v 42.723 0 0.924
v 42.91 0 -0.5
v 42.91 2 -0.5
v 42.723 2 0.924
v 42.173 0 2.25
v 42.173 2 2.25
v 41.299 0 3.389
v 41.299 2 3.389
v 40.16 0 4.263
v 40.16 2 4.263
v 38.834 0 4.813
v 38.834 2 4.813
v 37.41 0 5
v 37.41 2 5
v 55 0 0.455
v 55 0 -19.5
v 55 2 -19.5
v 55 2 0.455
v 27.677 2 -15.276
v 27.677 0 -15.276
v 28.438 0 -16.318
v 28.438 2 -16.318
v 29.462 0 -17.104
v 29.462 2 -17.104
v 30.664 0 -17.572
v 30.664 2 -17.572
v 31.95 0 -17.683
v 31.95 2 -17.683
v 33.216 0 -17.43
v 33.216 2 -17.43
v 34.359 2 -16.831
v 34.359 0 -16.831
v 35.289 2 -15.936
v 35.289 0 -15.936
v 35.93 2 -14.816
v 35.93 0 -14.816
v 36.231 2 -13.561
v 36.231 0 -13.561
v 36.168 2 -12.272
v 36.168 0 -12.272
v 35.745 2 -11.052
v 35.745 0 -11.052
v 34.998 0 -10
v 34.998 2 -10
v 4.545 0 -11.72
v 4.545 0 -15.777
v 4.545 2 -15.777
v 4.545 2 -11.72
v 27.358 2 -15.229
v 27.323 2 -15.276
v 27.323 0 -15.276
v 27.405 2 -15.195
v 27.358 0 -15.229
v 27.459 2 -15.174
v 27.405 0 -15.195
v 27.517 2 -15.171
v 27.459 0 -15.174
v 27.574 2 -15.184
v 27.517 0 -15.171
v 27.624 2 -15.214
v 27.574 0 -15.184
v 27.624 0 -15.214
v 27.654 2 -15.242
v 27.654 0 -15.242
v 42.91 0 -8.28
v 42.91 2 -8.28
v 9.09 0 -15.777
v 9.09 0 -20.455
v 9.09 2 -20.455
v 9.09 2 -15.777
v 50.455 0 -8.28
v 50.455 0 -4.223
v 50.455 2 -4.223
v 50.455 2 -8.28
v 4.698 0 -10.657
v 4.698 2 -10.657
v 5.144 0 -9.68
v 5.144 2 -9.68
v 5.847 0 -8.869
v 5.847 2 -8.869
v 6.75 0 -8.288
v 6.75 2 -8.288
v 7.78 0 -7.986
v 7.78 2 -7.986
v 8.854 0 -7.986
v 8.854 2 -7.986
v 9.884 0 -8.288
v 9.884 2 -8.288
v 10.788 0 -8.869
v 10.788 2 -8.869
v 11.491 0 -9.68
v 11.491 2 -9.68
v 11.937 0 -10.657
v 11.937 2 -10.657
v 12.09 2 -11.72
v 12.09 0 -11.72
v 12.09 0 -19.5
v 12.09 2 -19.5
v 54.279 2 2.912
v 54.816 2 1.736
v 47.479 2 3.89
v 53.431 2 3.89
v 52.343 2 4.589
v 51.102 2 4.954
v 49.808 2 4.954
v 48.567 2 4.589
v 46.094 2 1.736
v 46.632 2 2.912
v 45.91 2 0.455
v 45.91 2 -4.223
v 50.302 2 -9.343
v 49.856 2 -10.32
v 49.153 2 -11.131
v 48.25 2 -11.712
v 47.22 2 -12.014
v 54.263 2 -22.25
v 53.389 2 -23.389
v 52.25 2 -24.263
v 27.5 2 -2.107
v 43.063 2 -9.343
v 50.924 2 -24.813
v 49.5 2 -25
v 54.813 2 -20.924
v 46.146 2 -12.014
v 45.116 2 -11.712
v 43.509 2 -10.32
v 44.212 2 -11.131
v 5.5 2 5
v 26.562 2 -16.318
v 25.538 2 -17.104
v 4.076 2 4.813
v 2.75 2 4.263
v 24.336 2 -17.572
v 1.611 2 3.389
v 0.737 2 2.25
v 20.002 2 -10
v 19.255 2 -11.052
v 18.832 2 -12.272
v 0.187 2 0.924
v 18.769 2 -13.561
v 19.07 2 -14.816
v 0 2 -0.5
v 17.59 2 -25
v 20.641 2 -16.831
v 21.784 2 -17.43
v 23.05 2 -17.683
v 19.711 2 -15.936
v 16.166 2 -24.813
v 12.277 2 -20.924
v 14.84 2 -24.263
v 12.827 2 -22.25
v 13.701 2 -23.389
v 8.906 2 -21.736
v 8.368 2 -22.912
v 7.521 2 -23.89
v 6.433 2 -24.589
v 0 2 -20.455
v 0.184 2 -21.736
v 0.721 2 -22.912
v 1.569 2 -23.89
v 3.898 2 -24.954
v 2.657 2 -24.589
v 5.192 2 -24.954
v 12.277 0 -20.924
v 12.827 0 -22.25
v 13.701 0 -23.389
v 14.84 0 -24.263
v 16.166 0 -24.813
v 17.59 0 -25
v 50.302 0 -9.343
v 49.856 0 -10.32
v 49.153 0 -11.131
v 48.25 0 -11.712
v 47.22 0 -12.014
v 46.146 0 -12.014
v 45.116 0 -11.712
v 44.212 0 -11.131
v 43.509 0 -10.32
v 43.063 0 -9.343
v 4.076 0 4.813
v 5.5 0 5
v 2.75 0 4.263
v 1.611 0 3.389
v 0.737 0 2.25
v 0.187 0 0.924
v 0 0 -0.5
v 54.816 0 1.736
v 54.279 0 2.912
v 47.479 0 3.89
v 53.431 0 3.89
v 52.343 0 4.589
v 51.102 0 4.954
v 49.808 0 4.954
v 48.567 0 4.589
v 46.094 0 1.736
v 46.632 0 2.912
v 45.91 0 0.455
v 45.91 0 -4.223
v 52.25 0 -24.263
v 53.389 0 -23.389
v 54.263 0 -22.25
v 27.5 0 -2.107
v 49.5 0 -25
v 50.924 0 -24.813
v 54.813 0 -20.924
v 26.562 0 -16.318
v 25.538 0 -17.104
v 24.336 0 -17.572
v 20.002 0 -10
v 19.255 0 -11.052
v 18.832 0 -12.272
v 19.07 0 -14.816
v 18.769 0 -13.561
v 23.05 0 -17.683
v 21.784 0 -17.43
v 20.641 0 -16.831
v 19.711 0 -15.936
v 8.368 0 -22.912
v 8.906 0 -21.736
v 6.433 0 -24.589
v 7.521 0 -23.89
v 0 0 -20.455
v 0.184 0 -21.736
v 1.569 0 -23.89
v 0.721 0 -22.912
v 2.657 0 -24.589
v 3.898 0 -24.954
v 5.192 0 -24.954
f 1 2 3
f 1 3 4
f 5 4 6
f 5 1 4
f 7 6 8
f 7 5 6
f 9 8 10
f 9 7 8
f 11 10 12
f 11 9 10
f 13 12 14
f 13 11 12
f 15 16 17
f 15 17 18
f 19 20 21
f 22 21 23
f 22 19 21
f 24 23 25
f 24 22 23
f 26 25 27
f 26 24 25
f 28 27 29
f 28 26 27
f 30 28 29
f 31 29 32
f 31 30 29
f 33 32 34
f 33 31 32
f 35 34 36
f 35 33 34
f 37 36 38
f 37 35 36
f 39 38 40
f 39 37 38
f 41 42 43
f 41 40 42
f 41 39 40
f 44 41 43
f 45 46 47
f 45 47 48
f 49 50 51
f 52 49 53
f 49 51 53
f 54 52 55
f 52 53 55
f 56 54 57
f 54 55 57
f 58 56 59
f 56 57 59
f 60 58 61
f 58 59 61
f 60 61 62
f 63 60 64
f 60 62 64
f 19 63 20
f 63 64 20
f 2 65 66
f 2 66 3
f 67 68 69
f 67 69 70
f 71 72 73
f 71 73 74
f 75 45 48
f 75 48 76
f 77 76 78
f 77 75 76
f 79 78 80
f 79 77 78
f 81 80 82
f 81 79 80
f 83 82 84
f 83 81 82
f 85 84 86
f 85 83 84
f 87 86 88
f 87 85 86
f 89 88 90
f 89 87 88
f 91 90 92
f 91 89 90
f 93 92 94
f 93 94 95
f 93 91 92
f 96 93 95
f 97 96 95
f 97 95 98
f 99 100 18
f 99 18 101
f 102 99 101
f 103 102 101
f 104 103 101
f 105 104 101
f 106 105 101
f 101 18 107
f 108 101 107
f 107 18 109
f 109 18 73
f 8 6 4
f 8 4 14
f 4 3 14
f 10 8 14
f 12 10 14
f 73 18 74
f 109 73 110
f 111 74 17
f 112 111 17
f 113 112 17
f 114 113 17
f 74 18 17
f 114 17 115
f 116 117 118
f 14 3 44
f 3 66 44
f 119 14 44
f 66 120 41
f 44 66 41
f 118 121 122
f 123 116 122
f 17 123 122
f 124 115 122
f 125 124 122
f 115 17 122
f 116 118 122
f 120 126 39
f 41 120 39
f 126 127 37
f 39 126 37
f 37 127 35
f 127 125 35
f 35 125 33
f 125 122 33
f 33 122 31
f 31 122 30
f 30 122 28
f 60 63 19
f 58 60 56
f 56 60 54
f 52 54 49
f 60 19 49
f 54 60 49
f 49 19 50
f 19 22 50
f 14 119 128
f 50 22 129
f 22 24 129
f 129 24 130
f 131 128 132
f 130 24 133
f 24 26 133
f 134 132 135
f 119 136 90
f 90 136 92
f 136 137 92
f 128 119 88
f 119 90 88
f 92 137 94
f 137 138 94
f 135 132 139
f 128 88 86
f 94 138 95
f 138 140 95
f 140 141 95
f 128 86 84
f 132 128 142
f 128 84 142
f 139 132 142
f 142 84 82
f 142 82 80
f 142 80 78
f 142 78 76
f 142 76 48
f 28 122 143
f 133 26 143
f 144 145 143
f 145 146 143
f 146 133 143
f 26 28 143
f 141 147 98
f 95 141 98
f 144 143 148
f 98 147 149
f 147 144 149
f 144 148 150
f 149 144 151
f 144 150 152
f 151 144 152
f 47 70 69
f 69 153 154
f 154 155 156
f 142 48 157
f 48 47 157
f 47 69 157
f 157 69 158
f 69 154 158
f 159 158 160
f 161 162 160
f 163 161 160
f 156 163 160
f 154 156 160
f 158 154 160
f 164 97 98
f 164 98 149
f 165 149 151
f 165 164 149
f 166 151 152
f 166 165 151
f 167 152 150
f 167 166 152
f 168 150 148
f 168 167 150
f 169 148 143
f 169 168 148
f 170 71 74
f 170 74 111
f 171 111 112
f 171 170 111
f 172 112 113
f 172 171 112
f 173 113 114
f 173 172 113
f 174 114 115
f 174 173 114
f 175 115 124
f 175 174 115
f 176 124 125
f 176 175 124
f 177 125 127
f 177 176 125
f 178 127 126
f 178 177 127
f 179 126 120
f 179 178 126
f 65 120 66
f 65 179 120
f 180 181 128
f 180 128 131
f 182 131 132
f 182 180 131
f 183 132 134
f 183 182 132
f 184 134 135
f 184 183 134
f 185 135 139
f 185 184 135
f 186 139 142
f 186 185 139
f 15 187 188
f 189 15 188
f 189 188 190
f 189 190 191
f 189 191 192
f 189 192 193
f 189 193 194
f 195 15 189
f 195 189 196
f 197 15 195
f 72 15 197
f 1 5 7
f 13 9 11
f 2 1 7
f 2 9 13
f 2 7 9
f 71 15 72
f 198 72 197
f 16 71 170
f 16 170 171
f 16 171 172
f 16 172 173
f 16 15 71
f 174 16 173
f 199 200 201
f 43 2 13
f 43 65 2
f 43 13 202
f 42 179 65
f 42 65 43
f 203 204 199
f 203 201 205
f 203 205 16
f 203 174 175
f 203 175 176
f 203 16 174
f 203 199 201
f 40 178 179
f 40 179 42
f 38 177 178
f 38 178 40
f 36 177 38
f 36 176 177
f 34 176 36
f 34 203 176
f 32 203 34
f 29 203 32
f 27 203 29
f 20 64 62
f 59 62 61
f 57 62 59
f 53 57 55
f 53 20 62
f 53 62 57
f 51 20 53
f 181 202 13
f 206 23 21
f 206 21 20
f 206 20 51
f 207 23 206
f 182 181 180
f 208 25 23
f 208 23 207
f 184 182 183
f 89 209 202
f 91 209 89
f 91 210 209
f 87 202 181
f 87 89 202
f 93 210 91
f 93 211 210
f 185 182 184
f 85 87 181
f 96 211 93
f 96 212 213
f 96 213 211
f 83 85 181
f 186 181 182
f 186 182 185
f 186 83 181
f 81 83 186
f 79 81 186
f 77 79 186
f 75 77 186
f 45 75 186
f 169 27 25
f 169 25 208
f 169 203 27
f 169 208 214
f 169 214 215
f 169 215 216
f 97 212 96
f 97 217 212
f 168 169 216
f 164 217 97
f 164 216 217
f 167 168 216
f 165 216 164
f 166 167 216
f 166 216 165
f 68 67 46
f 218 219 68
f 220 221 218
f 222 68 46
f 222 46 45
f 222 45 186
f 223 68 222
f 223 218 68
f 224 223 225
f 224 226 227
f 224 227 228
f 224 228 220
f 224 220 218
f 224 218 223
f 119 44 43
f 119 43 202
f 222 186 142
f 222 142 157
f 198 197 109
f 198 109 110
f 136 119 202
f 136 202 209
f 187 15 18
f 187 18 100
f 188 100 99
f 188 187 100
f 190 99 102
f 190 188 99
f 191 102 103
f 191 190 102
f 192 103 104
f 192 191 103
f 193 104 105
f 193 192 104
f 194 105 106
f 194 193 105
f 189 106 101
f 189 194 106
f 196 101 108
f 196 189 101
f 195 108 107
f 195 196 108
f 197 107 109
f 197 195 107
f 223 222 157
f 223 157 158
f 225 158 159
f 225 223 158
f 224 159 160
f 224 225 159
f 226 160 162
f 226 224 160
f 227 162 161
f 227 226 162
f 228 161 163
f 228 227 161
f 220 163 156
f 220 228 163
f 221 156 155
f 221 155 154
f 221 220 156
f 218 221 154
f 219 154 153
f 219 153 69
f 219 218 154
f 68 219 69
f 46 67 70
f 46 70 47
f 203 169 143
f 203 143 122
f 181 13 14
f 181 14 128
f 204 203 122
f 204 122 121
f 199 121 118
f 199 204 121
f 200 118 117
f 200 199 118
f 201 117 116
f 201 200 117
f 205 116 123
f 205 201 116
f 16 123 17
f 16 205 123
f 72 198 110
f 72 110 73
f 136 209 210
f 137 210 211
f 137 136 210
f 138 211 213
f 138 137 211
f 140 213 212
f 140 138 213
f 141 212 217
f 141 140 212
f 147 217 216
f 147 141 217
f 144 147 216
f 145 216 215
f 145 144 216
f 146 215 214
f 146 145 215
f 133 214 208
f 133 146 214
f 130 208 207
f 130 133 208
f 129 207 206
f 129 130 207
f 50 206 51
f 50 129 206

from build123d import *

# Parameters (mm, degrees)
BOSS_EXTRUDE1_DEPTH = 2
CUT_EXTRUDE1_DEPTH  = 3
FILLET1_R           = 0.2


with BuildPart() as part:
    # Sketch2 → Boss-Extrude1 (new body)
    with BuildSketch(Plane(origin=(0, 0, 0), x_dir=(1, 0, 0), z_dir=(0, 1, 0))):
        with BuildLine():
            Line((0, 0.500000092), (0, 20.455103274))
            ThreePointArc((0, 20.455103274), (4.54489668, 25.000000092), (9.089793452, 20.455103365))
            Line((9.089793452, 20.455103365), (9.089793452, 15.776597525))
            Line((9.089793452, 15.776597525), (4.544896726, 15.776597525))
            Line((4.544896726, 15.776597525), (4.544896726, 11.719673062))
            ThreePointArc((4.544896726, 11.719673062), (8.317345089, 7.947224699), (12.089793452, 11.719673062))
            Line((12.089793452, 11.719673062), (12.089793452, 19.500000092))
            ThreePointArc((12.089793452, 19.500000092), (13.700706156, 23.389087388), (17.589793452, 25.000000092))
            Line((17.589793452, 25.000000092), (27.5, 25.000000092))
            Line((27.5, 25.000000092), (49.5, 25.000000092))
            ThreePointArc((49.5, 25.000000092), (53.389087297, 23.389087388), (55, 19.500000092))
            Line((55, 19.500000092), (55, -0.455103091))
            ThreePointArc((55, -0.455103091), (50.45510332, -4.999999908), (45.910206548, -0.455103182))
            Line((45.910206548, -0.455103182), (45.910206548, 4.223402658))
            Line((45.910206548, 4.223402658), (50.455103274, 4.223402658))
            Line((50.455103274, 4.223402658), (50.455103274, 8.280327121))
            ThreePointArc((50.455103274, 8.280327121), (46.682654911, 12.052775484), (42.910206548, 8.280327121))
            Line((42.910206548, 8.280327121), (42.910206548, 0.500000092))
            ThreePointArc((42.910206548, 0.500000092), (41.299293844, -3.389087205), (37.410206548, -4.999999908))
            Line((37.410206548, -4.999999908), (27.5, -4.999999908))
            Line((27.5, -4.999999908), (5.5, -4.999999908))
            ThreePointArc((5.5, -4.999999908), (1.610912703, -3.389087205), (0, 0.500000092))
        make_face()
    extrude(amount=BOSS_EXTRUDE1_DEPTH)

    # Sketch3 → Cut-Extrude1 (cut, through all)
    with BuildSketch(Plane(origin=(0, 2, 0), x_dir=(1, 0, 0), z_dir=(0, 1, 0))):
        with BuildLine():
            Line((27.5, 2.107265014), (20.001901677, 10.000000092))
            ThreePointArc((20.001901677, 10.000000092), (20.810460493, 16.947460398), (27.5, 14.905149634))
            ThreePointArc((27.5, 14.905149634), (34.189539507, 16.947460398), (34.998098323, 10.000000092))
            Line((34.998098323, 10.000000092), (27.5, 2.107265014))
        make_face()
    extrude(amount=-CUT_EXTRUDE1_DEPTH, mode=Mode.SUBTRACT)

    # Fillet1
    fillet1_edges = [part.edges().sort_by_distance(p)[0] for p in [
        (27.5, 1, -14.905149634),
    ]]
    fillet(fillet1_edges, radius=FILLET1_R)


solid = part.part
